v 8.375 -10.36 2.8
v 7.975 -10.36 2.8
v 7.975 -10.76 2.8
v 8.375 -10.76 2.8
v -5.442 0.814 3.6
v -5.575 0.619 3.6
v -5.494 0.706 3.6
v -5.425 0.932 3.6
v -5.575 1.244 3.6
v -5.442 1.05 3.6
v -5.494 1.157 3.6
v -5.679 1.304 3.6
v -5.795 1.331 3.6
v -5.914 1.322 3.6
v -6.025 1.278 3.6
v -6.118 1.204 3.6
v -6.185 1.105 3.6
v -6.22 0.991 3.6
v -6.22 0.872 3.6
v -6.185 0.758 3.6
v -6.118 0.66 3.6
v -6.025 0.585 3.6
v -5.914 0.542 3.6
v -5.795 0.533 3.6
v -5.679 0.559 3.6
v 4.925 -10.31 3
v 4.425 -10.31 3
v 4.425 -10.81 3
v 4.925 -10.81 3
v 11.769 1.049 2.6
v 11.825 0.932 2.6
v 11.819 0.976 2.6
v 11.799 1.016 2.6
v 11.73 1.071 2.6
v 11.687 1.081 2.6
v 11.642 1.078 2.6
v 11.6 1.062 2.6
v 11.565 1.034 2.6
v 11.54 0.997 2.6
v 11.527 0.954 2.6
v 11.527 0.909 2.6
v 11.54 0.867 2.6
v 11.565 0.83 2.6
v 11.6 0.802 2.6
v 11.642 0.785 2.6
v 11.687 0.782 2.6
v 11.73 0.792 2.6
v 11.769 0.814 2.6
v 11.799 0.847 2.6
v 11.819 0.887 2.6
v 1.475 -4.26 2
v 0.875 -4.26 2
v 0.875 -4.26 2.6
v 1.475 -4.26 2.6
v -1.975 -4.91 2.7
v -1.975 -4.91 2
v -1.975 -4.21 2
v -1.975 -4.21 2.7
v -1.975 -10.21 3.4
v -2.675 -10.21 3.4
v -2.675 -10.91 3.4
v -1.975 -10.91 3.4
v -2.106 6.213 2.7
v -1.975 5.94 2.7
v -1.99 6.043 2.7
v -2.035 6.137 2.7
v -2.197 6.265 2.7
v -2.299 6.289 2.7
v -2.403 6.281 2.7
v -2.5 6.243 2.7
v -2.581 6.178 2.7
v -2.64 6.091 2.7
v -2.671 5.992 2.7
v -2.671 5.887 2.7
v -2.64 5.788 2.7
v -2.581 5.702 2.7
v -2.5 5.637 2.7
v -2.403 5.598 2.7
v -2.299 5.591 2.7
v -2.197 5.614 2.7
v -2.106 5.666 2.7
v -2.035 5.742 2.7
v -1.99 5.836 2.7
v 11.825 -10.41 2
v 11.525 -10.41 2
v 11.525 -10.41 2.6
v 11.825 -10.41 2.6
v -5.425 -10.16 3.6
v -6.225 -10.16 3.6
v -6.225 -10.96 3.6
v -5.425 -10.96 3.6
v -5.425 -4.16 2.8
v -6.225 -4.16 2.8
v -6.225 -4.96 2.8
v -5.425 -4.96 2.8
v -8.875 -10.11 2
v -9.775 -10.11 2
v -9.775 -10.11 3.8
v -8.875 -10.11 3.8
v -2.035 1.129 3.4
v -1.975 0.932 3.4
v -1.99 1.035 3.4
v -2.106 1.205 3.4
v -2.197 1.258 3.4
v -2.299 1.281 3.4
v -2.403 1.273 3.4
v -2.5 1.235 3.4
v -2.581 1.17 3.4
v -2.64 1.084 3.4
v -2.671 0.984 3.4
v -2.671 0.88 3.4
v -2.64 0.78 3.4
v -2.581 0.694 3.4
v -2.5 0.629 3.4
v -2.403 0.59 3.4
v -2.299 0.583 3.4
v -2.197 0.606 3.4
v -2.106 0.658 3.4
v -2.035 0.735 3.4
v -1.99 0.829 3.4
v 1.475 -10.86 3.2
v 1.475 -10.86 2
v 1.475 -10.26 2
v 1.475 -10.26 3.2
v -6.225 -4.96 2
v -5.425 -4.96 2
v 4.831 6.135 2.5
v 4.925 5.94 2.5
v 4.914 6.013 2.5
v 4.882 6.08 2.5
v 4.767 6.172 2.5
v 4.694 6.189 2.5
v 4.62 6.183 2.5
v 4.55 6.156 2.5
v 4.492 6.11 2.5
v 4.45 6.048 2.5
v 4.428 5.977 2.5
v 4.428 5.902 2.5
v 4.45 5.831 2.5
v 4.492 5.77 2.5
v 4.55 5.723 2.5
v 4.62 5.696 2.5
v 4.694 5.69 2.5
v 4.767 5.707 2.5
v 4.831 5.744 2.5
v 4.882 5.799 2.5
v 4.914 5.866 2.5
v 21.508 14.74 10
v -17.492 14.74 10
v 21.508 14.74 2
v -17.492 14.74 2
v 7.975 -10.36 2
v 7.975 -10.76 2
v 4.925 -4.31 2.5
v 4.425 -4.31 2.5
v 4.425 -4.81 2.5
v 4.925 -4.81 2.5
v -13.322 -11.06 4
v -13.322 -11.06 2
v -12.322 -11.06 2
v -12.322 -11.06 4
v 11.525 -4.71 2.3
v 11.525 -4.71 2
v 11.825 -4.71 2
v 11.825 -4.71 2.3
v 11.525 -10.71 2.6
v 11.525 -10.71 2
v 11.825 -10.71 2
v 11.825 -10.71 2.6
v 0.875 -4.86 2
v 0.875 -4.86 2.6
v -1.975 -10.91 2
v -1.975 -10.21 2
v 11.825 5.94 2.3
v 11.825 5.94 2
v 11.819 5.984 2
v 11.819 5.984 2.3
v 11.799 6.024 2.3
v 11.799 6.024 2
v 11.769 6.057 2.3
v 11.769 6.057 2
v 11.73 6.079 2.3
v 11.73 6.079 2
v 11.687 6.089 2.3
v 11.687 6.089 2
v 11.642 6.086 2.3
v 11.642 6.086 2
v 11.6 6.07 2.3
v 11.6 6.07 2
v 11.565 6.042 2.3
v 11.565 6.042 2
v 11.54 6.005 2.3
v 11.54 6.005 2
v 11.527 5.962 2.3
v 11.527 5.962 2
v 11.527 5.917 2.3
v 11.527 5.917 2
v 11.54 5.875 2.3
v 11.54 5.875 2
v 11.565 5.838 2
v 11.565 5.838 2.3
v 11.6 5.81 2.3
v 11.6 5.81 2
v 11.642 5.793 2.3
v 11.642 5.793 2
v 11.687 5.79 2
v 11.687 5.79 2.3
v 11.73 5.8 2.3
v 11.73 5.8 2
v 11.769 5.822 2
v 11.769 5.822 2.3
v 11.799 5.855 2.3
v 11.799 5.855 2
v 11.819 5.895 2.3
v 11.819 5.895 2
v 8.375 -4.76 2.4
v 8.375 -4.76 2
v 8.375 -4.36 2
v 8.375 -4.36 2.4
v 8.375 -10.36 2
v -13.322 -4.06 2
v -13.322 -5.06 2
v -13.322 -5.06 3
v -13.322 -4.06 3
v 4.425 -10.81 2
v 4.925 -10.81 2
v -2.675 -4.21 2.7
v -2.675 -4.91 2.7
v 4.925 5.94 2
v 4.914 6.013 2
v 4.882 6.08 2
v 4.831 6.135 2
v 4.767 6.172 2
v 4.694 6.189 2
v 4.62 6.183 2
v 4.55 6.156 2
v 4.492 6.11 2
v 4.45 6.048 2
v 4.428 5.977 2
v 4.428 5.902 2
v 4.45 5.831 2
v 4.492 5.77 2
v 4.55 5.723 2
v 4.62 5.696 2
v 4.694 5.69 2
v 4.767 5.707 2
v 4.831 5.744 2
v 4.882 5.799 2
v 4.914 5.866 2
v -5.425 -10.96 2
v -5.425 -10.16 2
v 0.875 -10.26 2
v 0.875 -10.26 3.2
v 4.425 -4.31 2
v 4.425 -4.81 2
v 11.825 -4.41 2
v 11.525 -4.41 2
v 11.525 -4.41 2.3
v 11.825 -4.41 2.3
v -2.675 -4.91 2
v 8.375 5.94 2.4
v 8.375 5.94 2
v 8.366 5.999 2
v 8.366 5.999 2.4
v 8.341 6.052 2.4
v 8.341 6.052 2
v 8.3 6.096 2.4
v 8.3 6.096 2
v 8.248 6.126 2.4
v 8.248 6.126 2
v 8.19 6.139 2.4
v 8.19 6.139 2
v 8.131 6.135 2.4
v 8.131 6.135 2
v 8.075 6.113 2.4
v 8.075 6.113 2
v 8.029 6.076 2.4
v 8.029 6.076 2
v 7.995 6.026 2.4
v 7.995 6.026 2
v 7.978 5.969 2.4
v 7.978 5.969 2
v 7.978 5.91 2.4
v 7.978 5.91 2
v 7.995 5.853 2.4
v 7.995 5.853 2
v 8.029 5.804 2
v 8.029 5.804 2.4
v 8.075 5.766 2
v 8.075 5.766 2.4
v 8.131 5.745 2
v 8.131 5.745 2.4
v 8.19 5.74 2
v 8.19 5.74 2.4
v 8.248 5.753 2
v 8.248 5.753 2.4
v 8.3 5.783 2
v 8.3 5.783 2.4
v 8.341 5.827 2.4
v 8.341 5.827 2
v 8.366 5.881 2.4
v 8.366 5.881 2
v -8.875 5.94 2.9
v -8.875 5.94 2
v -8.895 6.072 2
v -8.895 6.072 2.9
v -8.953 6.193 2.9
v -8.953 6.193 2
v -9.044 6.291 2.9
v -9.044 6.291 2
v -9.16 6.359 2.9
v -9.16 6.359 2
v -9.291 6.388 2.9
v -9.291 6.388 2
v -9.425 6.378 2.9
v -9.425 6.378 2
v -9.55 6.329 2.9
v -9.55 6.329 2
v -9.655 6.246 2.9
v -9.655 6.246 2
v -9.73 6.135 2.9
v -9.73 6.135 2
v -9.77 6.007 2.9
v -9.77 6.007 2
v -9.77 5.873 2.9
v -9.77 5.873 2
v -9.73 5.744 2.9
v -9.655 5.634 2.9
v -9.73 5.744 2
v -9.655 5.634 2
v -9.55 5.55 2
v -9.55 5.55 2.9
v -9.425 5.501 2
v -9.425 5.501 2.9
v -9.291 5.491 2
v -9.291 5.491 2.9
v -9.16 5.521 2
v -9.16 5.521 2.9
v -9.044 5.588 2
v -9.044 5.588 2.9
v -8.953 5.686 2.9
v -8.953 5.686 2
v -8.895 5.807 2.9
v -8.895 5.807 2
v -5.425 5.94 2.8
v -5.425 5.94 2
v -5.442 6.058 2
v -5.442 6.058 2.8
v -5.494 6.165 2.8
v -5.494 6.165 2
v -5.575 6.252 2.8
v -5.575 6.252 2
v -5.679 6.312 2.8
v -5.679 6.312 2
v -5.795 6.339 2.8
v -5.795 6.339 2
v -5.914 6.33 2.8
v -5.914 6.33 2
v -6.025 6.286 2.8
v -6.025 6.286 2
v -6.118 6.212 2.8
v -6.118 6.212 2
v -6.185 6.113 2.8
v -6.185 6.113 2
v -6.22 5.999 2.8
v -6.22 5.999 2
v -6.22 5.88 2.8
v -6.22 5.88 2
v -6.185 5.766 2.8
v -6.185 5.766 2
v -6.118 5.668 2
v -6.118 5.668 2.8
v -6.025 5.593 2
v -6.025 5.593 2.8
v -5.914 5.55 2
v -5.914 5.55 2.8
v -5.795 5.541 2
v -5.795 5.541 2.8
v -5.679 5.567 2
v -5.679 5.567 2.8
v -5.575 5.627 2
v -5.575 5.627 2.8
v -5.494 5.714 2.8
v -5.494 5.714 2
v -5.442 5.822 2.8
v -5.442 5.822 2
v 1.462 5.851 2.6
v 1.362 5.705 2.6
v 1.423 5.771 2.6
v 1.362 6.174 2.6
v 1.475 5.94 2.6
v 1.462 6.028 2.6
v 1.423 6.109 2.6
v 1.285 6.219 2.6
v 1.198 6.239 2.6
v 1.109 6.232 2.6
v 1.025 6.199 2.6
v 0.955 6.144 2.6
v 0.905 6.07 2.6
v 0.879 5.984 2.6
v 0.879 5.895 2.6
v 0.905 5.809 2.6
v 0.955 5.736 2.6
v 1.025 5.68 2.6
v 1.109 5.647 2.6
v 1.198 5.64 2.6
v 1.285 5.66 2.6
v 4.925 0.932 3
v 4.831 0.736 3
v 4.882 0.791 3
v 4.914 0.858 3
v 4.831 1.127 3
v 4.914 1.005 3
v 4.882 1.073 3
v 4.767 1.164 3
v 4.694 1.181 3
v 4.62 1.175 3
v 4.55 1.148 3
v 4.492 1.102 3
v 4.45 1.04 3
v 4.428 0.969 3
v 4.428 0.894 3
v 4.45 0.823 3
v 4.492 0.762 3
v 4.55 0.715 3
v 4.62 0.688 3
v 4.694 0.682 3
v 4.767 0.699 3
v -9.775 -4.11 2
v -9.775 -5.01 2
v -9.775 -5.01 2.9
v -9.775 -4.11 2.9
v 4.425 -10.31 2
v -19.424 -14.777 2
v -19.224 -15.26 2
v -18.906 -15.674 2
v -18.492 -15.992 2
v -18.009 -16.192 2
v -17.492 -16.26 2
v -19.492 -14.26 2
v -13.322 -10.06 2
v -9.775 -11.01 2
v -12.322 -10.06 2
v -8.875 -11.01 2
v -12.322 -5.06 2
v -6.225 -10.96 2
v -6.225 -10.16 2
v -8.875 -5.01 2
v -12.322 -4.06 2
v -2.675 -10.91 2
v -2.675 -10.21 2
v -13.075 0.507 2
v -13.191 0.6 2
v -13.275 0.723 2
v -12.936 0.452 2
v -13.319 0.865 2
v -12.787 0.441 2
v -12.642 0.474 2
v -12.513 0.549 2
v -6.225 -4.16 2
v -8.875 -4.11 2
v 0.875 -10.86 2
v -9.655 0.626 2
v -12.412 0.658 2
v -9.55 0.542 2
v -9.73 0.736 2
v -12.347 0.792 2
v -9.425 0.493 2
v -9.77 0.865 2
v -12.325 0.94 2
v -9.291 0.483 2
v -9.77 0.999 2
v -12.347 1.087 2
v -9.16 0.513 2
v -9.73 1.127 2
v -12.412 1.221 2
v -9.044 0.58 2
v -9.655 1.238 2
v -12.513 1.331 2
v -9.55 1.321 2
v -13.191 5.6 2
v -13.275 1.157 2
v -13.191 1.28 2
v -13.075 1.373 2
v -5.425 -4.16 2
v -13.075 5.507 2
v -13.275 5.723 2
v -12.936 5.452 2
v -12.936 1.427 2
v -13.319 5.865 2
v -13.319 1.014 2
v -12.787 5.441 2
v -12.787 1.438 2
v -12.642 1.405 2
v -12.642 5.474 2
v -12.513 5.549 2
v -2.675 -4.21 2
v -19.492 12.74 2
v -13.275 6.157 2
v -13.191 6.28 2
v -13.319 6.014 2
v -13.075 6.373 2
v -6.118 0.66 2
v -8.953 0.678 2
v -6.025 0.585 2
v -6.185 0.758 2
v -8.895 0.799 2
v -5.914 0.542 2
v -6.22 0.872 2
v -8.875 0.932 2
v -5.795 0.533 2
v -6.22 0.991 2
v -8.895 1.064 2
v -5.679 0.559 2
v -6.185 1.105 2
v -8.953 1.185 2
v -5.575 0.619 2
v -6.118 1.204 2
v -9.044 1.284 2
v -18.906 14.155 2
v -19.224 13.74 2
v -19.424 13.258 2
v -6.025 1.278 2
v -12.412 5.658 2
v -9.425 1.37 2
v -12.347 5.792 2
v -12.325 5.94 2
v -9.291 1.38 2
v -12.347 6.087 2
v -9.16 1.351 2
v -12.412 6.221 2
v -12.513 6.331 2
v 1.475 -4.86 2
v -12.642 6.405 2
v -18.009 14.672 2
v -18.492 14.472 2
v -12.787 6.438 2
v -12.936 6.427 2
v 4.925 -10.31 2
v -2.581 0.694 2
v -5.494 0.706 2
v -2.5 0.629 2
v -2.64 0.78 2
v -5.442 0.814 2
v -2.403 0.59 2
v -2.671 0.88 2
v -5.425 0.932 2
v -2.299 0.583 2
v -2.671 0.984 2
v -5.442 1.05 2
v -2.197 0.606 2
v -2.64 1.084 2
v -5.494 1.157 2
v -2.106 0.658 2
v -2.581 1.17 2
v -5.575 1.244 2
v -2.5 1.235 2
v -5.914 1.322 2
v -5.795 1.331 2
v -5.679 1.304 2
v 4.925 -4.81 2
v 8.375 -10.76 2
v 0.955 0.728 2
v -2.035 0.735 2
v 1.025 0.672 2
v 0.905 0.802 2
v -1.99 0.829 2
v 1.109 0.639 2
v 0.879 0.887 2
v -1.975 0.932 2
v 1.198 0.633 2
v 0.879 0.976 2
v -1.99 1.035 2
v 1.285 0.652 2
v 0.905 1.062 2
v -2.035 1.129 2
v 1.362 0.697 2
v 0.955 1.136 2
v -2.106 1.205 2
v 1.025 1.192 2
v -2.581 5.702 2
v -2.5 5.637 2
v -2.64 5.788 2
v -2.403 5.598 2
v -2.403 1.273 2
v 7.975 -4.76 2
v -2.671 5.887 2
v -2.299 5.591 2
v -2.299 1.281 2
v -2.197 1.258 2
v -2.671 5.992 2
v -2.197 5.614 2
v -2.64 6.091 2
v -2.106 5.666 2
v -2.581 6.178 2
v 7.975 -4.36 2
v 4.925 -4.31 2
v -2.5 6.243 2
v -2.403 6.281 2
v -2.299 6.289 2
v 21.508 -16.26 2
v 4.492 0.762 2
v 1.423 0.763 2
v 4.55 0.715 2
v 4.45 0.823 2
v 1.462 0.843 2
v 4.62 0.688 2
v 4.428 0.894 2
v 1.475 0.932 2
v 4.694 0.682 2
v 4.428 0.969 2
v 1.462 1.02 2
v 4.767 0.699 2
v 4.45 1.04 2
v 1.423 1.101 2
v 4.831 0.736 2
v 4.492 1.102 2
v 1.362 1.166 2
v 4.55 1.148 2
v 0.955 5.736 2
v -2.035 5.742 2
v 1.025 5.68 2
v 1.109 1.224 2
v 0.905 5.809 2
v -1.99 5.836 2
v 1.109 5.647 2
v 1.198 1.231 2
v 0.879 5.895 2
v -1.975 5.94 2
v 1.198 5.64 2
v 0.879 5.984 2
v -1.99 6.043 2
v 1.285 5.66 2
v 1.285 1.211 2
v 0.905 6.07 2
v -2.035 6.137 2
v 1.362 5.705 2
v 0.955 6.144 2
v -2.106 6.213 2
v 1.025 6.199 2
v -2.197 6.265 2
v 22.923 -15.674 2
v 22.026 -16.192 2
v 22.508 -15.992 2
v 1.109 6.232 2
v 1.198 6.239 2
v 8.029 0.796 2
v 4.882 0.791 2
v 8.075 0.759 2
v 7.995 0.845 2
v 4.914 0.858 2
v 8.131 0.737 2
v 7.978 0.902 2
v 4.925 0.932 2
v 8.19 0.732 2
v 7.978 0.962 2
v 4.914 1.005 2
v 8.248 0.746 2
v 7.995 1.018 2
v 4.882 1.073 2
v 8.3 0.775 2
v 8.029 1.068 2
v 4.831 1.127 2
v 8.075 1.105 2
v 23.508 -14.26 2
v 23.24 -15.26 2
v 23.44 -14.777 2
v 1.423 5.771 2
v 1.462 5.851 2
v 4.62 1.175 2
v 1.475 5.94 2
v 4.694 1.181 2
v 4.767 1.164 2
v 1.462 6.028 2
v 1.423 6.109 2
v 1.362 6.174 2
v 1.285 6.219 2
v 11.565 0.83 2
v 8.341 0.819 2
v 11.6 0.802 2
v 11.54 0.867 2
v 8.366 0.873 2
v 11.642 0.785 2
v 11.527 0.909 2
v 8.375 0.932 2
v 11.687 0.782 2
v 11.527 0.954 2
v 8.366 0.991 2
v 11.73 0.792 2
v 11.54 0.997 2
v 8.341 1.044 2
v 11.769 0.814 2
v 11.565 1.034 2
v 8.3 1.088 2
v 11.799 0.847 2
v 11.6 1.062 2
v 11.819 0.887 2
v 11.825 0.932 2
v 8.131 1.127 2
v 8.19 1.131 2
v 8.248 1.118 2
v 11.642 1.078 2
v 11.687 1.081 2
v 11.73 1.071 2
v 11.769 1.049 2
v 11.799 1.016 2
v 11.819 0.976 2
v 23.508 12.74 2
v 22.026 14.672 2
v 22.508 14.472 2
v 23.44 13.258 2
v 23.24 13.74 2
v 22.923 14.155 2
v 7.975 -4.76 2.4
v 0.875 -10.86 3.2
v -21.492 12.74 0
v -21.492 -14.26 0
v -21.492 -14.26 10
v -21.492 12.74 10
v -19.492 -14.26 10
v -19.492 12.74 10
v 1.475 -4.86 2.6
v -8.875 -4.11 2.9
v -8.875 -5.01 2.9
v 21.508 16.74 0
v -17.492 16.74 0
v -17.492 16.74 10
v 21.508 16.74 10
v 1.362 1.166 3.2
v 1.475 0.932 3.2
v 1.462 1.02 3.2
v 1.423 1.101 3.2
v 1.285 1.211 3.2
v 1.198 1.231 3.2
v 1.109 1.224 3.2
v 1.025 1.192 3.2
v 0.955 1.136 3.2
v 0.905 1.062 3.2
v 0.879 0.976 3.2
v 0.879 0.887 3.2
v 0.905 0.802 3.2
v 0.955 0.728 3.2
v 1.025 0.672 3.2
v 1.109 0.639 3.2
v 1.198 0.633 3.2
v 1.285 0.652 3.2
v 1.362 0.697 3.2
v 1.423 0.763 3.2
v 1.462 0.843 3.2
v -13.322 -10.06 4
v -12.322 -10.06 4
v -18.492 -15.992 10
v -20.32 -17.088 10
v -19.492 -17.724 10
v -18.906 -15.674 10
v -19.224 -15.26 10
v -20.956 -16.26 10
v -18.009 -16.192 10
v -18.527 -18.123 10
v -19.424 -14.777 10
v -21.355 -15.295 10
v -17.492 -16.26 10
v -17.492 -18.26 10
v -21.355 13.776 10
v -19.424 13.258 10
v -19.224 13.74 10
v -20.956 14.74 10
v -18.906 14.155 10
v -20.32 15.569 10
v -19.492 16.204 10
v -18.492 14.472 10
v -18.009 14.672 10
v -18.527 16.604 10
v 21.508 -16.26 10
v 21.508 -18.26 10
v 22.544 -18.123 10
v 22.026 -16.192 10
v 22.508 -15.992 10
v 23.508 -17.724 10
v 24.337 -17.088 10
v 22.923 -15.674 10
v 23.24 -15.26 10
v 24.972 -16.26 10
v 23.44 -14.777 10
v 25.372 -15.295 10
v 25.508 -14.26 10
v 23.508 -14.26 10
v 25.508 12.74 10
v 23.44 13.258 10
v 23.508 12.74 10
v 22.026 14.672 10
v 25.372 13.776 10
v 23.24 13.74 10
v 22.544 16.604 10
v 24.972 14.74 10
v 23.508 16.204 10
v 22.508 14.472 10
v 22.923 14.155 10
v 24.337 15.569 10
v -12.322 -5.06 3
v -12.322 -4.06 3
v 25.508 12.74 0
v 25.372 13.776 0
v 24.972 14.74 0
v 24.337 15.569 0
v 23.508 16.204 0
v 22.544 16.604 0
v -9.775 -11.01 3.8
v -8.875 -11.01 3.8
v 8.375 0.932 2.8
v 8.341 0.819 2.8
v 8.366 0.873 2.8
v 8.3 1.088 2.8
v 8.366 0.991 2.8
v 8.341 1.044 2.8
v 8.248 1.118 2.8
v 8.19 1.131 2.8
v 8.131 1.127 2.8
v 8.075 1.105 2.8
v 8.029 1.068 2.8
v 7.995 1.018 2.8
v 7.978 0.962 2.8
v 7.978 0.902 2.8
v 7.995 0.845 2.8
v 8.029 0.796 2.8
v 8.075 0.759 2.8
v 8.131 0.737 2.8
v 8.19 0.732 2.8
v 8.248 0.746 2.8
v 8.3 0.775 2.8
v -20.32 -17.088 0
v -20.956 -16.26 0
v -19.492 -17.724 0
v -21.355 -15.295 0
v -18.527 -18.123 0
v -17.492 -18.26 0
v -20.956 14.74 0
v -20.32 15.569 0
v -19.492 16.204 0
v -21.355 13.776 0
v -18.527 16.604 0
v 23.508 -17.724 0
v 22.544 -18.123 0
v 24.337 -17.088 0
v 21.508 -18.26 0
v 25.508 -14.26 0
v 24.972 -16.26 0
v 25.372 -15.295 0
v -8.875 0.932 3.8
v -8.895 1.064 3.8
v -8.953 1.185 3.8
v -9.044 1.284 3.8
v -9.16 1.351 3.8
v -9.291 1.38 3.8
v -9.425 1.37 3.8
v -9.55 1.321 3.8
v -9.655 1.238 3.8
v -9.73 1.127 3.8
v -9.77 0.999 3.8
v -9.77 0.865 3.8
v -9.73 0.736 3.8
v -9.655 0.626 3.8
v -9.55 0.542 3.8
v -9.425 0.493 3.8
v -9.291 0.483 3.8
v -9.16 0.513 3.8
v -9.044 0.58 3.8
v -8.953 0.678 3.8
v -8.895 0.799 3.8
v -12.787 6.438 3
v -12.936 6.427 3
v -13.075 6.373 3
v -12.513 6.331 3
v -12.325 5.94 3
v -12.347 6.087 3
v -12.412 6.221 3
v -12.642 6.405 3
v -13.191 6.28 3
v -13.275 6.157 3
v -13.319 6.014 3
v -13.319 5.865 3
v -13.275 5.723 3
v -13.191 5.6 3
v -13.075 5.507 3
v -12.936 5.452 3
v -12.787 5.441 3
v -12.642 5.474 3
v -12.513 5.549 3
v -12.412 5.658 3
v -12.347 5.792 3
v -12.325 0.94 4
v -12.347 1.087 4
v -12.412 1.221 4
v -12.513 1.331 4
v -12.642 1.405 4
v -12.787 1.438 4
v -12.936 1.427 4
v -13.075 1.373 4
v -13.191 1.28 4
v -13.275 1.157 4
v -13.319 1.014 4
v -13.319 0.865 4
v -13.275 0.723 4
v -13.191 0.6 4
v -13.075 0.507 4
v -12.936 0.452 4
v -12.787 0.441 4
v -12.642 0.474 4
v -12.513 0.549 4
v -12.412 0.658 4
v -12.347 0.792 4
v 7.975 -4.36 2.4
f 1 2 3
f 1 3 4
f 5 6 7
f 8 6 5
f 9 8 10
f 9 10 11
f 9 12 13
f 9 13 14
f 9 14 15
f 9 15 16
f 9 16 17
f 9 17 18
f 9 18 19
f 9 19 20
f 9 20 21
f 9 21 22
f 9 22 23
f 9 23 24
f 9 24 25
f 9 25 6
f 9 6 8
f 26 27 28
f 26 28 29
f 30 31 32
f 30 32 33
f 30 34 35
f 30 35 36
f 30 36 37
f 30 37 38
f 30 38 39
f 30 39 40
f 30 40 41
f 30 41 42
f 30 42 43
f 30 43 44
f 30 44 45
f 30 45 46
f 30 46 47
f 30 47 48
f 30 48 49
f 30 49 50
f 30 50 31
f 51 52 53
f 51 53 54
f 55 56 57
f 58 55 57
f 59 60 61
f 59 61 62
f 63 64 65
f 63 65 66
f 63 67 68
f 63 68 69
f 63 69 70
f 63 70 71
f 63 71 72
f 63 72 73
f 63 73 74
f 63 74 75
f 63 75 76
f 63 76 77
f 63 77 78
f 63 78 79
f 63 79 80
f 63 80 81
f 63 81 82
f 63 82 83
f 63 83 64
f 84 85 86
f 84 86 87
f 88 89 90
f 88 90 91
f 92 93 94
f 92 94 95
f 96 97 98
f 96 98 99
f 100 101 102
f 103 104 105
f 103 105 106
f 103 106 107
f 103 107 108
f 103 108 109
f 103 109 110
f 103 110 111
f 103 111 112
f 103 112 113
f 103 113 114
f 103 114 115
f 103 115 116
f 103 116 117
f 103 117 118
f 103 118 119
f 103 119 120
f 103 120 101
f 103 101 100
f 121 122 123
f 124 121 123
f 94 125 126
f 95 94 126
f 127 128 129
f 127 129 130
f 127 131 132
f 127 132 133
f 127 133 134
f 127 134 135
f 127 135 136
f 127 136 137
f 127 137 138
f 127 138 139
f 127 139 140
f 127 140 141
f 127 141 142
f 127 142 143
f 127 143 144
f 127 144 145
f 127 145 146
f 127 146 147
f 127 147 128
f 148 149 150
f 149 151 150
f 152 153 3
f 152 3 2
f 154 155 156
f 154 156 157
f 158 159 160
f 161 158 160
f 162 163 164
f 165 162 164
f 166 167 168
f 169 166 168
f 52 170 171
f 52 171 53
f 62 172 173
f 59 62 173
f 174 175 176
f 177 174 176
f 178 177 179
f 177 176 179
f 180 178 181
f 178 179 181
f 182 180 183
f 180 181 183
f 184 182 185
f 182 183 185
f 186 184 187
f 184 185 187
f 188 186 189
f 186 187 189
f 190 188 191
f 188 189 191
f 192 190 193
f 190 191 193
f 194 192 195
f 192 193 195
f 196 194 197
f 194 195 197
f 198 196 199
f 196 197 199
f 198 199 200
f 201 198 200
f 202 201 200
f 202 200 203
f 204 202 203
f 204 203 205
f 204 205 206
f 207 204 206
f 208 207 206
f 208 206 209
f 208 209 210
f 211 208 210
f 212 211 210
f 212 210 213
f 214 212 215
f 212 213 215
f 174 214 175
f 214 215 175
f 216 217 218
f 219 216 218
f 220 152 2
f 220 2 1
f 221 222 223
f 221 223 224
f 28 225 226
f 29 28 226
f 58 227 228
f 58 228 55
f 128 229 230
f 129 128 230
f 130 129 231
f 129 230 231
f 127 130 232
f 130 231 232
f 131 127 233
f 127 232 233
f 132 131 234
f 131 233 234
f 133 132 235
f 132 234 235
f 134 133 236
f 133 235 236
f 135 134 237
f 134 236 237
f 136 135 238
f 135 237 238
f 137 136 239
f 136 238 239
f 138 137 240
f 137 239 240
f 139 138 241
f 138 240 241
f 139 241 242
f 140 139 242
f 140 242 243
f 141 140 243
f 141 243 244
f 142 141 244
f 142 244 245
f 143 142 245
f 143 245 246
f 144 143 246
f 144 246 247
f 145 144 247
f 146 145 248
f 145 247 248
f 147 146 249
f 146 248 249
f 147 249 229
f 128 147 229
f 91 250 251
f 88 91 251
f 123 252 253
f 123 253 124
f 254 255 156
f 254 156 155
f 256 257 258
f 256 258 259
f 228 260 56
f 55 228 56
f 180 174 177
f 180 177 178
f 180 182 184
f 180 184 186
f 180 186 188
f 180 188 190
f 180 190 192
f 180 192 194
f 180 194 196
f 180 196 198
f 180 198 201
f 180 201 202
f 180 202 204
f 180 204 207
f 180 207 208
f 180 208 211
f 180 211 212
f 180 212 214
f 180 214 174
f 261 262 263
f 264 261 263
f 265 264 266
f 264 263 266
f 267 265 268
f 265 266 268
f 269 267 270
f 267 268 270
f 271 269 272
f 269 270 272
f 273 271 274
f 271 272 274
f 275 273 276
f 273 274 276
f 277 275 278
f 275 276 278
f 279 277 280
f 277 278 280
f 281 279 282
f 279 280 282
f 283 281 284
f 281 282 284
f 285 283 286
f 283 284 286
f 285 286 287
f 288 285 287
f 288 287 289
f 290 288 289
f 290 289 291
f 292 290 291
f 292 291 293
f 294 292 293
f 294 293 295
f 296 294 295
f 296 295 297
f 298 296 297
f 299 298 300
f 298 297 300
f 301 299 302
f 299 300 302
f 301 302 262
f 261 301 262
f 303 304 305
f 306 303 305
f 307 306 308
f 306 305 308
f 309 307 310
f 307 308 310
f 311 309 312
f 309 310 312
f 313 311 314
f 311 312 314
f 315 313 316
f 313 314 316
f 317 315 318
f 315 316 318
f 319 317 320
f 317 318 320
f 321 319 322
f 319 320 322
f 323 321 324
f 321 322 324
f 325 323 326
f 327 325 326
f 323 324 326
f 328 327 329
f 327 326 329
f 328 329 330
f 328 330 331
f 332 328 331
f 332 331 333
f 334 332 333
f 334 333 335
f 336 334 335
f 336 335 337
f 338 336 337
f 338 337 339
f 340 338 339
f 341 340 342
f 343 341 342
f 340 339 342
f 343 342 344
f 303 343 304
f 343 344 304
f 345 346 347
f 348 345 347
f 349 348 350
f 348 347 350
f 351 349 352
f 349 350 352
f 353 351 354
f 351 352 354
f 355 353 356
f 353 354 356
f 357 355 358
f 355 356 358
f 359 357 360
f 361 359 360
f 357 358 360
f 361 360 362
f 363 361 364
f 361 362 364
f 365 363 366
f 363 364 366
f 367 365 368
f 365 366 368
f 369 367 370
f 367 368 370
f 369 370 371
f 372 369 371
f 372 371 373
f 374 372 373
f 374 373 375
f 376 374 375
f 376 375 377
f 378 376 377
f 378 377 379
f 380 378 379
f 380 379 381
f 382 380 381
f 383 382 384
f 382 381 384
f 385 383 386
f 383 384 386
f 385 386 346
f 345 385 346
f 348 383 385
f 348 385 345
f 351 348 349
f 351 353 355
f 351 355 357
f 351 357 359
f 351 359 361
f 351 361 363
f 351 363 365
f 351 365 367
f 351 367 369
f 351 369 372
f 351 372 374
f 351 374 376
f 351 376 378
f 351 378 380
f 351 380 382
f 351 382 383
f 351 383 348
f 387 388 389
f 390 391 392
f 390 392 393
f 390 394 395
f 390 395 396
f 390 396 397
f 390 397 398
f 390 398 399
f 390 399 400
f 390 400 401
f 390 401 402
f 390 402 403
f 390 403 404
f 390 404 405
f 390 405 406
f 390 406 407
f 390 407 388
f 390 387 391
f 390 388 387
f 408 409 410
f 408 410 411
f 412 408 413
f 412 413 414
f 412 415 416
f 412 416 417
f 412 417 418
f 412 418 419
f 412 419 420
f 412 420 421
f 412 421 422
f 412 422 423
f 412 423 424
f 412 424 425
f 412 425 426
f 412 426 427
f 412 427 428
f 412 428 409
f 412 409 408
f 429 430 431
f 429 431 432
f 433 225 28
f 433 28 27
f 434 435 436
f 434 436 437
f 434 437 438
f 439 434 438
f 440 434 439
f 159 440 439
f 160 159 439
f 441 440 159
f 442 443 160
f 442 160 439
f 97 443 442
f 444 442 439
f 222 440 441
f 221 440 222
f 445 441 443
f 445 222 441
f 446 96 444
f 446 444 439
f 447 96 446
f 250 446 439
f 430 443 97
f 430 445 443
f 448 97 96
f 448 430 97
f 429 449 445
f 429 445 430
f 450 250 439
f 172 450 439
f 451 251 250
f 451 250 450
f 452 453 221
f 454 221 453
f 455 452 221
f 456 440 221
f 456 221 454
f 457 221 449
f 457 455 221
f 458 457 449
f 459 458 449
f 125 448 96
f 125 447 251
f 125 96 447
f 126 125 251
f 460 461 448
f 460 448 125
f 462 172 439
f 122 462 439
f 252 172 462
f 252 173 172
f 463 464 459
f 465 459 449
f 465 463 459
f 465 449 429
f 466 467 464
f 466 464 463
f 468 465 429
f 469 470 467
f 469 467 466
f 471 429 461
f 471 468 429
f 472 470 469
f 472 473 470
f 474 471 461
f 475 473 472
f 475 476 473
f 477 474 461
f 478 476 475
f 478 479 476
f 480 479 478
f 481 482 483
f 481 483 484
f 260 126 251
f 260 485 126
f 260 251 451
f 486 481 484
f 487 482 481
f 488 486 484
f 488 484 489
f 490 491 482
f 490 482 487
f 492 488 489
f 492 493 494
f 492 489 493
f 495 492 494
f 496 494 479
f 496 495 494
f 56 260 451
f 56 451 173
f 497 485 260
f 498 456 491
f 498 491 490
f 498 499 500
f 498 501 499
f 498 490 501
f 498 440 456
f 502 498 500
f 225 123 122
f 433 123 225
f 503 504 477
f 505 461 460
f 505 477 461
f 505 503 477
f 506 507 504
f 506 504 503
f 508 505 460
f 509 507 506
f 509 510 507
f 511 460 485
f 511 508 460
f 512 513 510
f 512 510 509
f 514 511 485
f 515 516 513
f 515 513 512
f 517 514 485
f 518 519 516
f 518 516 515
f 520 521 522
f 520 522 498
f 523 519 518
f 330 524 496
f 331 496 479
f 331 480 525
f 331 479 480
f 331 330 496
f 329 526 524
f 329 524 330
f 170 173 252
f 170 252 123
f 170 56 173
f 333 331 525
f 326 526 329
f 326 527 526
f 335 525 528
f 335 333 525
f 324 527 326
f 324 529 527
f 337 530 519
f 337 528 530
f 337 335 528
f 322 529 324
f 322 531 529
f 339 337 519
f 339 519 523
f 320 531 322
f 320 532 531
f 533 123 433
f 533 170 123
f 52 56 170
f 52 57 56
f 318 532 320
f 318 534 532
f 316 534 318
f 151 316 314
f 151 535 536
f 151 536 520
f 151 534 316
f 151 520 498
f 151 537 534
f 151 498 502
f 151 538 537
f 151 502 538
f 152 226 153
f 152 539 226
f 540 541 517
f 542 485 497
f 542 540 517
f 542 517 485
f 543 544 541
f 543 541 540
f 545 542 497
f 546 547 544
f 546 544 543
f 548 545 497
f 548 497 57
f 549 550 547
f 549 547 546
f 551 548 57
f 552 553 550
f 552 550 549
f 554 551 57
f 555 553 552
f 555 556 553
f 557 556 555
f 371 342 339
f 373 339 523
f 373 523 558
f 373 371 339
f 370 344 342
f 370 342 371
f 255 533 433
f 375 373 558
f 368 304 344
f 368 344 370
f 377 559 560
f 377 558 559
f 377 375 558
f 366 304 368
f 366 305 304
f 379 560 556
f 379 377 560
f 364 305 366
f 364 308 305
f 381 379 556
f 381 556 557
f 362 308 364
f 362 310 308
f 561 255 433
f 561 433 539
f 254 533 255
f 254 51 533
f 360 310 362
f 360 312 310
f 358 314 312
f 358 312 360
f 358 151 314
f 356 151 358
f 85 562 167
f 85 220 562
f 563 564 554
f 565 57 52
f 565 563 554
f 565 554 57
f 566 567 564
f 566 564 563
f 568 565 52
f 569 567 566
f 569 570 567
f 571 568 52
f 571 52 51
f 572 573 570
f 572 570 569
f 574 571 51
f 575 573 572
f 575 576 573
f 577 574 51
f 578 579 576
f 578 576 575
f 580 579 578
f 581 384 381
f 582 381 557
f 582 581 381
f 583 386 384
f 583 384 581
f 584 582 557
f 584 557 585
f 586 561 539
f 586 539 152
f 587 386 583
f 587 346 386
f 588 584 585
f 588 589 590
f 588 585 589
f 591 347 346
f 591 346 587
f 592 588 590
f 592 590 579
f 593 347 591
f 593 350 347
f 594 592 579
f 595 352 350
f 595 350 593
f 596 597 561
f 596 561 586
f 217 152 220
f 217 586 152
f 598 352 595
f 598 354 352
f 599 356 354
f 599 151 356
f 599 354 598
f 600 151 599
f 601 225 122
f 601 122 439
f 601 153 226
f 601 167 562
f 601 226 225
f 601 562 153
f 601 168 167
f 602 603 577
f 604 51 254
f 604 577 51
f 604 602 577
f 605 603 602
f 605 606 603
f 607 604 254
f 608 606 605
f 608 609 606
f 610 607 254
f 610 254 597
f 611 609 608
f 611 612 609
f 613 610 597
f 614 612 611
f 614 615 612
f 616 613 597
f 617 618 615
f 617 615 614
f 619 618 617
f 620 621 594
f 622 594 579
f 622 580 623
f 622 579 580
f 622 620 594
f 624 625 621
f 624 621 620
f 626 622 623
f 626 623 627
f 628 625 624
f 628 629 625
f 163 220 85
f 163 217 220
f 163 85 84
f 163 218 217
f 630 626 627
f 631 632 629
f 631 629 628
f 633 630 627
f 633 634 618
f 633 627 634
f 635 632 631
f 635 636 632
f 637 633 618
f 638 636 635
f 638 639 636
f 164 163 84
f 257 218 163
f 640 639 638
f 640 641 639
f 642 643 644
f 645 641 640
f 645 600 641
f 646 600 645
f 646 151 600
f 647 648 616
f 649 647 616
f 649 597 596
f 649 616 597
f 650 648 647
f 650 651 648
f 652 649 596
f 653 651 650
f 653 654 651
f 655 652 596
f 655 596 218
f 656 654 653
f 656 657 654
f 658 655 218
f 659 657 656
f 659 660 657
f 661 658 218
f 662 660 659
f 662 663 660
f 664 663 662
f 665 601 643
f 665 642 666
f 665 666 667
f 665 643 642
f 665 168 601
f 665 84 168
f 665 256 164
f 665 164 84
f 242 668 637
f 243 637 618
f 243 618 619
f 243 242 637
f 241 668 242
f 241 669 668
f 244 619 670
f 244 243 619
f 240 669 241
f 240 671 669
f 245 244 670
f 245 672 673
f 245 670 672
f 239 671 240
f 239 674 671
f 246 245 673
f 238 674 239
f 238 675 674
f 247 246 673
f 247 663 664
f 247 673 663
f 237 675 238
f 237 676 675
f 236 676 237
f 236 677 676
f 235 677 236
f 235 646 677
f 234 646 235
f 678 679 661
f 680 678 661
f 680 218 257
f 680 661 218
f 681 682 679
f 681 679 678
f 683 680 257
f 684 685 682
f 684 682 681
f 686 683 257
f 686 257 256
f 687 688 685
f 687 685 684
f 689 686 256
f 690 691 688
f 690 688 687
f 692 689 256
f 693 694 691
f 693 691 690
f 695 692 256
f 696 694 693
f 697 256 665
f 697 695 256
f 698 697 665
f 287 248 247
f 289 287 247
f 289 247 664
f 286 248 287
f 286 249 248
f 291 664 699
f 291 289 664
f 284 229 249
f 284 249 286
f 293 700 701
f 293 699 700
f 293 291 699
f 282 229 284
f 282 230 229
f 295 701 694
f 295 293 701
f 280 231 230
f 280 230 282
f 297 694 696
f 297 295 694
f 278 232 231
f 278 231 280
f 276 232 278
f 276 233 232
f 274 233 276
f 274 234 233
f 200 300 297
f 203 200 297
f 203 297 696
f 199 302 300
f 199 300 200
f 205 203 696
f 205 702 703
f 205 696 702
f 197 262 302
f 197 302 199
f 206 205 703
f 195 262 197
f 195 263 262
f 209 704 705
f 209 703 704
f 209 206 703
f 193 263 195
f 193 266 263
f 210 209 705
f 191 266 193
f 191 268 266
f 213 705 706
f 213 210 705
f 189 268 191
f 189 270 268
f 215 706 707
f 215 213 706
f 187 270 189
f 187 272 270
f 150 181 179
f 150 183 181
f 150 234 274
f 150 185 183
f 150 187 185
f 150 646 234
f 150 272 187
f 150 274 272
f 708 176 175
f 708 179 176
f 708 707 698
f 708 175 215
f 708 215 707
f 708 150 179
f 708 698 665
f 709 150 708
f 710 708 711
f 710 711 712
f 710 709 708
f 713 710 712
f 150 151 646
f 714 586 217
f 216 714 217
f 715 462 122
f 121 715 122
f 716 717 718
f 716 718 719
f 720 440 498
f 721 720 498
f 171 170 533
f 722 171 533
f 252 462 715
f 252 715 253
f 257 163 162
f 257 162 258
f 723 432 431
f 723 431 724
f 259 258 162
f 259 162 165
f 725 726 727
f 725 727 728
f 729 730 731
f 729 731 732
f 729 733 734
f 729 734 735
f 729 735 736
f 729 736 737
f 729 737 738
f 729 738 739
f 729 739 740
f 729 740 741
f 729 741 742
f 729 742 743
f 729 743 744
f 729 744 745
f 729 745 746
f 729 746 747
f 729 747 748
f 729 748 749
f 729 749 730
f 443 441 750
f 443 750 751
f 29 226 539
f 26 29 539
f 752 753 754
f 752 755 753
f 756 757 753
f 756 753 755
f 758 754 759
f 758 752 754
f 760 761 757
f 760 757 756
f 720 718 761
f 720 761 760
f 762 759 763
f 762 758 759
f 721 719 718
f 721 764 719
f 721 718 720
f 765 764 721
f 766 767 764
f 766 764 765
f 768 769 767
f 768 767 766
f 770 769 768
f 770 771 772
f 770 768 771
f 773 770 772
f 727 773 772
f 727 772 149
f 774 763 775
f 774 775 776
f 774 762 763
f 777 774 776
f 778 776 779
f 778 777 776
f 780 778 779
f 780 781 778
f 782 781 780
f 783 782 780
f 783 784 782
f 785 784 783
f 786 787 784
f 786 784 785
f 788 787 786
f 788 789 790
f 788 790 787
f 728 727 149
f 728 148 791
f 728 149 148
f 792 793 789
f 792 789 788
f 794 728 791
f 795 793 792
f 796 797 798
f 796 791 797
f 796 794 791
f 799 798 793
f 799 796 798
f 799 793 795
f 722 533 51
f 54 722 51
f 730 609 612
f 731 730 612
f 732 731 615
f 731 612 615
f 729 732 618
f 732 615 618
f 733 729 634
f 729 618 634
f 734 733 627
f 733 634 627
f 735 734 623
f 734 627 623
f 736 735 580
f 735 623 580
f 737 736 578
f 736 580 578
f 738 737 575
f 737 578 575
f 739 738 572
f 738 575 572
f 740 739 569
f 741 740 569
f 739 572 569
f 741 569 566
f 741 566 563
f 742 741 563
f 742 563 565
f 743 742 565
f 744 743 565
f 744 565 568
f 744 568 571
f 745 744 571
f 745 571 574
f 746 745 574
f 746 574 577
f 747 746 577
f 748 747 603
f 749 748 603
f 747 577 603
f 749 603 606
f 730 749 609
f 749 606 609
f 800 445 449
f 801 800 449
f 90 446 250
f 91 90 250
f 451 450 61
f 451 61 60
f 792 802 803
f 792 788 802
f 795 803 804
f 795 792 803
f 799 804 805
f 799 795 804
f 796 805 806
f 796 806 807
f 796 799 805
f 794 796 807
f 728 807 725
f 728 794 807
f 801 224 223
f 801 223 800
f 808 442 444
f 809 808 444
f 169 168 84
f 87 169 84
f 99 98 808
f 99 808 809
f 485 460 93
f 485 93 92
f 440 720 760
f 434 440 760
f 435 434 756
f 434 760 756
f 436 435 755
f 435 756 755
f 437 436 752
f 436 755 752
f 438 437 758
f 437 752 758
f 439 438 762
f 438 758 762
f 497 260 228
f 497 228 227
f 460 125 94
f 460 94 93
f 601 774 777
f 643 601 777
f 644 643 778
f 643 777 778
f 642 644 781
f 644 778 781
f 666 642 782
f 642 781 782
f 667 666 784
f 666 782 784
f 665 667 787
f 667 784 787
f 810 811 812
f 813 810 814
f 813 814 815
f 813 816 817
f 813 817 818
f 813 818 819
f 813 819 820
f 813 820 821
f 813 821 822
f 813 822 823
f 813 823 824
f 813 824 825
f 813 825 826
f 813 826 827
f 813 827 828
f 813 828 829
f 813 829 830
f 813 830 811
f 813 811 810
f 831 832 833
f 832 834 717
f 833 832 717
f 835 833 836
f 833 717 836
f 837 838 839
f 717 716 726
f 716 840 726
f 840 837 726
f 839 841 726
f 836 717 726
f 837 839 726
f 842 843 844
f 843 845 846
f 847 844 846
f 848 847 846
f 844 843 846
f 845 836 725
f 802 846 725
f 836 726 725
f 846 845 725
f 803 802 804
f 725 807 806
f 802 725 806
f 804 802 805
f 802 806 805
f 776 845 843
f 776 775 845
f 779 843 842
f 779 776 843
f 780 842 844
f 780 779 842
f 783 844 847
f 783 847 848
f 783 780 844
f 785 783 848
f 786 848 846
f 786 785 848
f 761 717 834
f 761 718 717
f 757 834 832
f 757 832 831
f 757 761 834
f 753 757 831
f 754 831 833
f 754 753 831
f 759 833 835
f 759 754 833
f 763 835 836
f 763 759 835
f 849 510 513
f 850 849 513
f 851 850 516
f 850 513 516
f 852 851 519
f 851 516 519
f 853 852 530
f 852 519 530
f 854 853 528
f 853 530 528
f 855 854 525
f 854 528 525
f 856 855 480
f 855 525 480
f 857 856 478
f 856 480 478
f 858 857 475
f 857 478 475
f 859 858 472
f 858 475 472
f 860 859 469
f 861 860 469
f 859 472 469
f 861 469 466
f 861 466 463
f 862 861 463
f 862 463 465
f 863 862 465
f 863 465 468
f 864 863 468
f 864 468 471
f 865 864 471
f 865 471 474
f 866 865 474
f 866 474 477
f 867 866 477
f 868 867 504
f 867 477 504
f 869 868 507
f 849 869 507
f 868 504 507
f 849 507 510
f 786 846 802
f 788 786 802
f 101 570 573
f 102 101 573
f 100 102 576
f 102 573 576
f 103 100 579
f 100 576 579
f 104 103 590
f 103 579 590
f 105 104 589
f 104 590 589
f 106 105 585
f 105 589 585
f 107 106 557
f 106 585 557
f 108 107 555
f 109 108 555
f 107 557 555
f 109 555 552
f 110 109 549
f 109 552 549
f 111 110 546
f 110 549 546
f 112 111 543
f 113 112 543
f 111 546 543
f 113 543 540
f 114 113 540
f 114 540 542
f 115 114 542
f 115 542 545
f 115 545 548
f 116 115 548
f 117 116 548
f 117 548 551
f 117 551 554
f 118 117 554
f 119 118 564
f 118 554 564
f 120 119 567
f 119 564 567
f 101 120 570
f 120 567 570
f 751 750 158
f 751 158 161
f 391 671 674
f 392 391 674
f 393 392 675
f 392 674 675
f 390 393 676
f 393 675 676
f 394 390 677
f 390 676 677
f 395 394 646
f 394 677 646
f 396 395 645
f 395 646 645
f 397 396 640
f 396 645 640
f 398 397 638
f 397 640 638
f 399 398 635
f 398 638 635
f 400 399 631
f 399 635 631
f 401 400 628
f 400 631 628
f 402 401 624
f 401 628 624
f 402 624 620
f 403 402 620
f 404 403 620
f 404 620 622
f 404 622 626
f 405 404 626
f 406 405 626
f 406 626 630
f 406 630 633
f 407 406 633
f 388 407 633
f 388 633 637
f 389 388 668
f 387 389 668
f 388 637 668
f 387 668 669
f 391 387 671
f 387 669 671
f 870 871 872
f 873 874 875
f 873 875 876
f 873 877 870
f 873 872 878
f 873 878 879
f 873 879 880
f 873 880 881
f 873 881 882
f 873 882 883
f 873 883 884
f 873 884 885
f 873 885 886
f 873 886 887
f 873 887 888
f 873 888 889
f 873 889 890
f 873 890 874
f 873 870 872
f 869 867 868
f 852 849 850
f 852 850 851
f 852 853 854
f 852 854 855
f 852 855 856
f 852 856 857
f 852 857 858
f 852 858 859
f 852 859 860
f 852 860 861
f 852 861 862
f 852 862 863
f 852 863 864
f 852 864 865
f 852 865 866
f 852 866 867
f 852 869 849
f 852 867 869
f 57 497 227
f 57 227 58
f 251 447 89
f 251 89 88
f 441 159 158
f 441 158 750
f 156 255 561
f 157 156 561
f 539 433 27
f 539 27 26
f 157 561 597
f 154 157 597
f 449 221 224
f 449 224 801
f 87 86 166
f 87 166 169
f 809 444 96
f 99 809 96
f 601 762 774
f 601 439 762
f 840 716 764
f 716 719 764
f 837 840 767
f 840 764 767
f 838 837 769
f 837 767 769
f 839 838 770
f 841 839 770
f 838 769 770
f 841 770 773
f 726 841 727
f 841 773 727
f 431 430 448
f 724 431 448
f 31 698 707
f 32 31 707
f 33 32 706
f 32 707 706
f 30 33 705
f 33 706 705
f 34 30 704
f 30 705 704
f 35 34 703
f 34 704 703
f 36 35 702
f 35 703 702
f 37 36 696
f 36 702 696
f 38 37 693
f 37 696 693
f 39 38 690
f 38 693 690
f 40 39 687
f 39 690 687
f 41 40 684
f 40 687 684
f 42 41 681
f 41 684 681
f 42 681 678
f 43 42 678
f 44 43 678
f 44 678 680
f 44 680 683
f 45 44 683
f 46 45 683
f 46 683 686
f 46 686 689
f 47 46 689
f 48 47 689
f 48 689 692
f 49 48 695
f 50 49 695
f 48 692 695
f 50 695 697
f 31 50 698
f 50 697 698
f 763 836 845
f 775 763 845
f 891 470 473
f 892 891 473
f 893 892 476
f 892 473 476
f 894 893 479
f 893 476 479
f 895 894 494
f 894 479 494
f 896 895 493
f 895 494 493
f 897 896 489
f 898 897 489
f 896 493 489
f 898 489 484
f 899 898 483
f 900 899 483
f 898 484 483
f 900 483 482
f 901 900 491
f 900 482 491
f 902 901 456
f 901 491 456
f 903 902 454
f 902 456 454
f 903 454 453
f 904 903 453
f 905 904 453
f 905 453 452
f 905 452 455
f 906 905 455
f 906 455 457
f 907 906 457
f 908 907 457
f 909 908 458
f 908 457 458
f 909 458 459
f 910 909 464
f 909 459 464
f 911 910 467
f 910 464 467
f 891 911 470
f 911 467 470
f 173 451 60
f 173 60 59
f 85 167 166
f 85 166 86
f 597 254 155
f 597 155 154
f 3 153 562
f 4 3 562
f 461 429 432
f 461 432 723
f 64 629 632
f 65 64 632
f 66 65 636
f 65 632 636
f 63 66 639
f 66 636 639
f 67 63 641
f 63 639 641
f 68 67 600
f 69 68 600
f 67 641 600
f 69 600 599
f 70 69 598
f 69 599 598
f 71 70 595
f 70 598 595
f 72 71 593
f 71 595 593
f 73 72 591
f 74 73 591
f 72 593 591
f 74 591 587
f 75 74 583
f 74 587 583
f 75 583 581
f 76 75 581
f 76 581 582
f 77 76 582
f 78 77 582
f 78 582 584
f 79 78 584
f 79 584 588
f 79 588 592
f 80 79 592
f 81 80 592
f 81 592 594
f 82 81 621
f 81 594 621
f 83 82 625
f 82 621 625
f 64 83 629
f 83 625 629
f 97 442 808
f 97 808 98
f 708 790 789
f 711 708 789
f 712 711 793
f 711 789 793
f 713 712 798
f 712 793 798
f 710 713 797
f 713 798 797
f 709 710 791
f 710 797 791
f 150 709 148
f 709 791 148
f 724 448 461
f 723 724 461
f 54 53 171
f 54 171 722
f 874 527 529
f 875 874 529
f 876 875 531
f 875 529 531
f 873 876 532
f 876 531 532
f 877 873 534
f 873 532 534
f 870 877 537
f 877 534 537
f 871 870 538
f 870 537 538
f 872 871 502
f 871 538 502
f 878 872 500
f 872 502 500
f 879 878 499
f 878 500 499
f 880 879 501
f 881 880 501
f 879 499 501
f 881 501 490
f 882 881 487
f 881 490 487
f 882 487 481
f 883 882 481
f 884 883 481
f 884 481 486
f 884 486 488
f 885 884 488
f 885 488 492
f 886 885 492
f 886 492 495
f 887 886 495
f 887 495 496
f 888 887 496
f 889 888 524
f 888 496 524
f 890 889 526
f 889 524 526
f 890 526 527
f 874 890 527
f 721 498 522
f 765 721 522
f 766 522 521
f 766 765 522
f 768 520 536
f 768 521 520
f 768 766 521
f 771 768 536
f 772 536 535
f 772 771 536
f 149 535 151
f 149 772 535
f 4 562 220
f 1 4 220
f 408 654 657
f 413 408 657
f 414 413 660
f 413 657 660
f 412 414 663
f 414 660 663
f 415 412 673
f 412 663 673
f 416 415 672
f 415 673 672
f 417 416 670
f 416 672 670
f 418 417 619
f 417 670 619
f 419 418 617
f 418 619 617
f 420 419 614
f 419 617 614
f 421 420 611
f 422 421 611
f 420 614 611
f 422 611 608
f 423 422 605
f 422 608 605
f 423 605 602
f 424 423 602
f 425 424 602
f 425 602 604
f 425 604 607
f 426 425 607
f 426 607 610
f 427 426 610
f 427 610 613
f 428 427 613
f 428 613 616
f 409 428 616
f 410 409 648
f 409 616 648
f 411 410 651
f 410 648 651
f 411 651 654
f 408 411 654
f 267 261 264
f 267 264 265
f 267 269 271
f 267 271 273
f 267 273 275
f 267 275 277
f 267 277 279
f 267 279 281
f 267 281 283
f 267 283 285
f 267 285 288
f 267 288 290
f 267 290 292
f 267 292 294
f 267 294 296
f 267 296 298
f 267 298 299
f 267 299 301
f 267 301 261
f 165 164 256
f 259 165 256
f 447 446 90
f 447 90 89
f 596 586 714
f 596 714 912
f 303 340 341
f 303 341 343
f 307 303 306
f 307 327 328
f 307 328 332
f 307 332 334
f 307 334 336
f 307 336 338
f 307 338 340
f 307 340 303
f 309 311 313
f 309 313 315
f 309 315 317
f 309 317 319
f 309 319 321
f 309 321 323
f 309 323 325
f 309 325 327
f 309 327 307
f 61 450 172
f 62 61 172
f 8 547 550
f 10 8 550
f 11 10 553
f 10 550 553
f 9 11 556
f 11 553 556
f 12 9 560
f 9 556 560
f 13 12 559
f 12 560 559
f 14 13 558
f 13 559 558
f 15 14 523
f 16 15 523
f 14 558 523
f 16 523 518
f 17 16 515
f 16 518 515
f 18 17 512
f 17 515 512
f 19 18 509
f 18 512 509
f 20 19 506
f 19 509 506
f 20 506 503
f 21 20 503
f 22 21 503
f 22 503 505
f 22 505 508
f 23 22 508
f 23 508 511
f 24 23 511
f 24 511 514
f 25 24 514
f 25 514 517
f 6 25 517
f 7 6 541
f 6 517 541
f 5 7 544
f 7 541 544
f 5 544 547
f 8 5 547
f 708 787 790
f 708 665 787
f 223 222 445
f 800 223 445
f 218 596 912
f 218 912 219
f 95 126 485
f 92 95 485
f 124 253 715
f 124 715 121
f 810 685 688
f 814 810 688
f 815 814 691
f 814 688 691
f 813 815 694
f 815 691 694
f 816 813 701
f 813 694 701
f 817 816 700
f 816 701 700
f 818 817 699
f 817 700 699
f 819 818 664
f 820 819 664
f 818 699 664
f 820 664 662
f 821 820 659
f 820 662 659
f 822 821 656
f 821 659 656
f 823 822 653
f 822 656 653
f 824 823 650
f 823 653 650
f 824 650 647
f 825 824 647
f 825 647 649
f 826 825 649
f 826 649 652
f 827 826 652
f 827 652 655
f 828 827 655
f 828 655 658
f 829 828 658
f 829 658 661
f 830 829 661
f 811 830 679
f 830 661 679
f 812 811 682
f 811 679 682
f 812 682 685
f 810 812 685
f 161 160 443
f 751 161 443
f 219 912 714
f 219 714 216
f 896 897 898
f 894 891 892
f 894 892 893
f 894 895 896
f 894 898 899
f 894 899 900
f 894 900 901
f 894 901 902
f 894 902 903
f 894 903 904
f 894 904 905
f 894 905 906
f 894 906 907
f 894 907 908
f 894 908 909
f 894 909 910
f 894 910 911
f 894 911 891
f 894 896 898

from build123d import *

# Parameters (mm, degrees)
SKETCH1_W            = 47
SKETCH1_H            = 35
BOSS_EXTRUDE1_DEPTH  = 10
FILLET1_R            = 4
SHELL1_T             = -2
SKETCH2_R            = 0.5
BOSS_EXTRUDE6_DEPTH  = 1
SKETCH3_R            = 0.45
BOSS_EXTRUDE7_DEPTH  = 0.9
SKETCH4_R            = 0.4
BOSS_EXTRUDE8_DEPTH  = 0.8
SKETCH5_R            = 0.35
BOSS_EXTRUDE9_DEPTH  = 0.7
SKETCH6_R            = 0.3
BOSS_EXTRUDE10_DEPTH = 0.6
SKETCH7_R            = 0.25
BOSS_EXTRUDE11_DEPTH = 0.5
SKETCH8_R            = 0.2
BOSS_EXTRUDE12_DEPTH = 0.4
SKETCH9_R            = 0.15
BOSS_EXTRUDE13_DEPTH = 0.3
SKETCH10_R           = 0.5
BOSS_EXTRUDE14_DEPTH = 2
SKETCH11_R           = 0.45
BOSS_EXTRUDE15_DEPTH = 1.8
SKETCH12_R           = 0.4
BOSS_EXTRUDE16_DEPTH = 1.6
SKETCH13_R           = 0.35
BOSS_EXTRUDE17_DEPTH = 1.4
SKETCH14_R           = 0.3
BOSS_EXTRUDE18_DEPTH = 1.2
SKETCH15_R           = 0.25
BOSS_EXTRUDE19_DEPTH = 1
SKETCH16_R           = 0.2
BOSS_EXTRUDE20_DEPTH = 0.8
SKETCH17_R           = 0.15
BOSS_EXTRUDE21_DEPTH = 0.6
SKETCH18_W           = 1
SKETCH18_H           = 1
BOSS_EXTRUDE22_DEPTH = 1
SKETCH20_W           = 0.9
SKETCH20_H           = 0.9
BOSS_EXTRUDE23_DEPTH = 0.9
SKETCH21_W           = 0.8
SKETCH21_H           = 0.8
BOSS_EXTRUDE24_DEPTH = 0.8
SKETCH22_W           = 0.7
SKETCH22_H           = 0.7
BOSS_EXTRUDE25_DEPTH = 0.7
SKETCH23_W           = 0.6
SKETCH23_H           = 0.6
BOSS_EXTRUDE26_DEPTH = 0.6
SKETCH24_W           = 0.5
SKETCH24_H           = 0.5
BOSS_EXTRUDE27_DEPTH = 0.5
SKETCH25_W           = 0.4
SKETCH25_H           = 0.4
BOSS_EXTRUDE28_DEPTH = 0.4
SKETCH26_W           = 0.3
SKETCH26_H           = 0.3
BOSS_EXTRUDE29_DEPTH = 0.3
SKETCH27_W           = 1
SKETCH27_H           = 1
BOSS_EXTRUDE30_DEPTH = 2
SKETCH28_W           = 0.9
SKETCH28_H           = 0.9
BOSS_EXTRUDE31_DEPTH = 1.8
SKETCH29_W           = 0.8
SKETCH29_H           = 0.8
BOSS_EXTRUDE32_DEPTH = 1.6
SKETCH30_W           = 0.7
SKETCH30_H           = 0.7
BOSS_EXTRUDE33_DEPTH = 1.4
SKETCH31_W           = 0.6
SKETCH31_H           = 0.6
BOSS_EXTRUDE34_DEPTH = 1.2
SKETCH32_W           = 0.5
SKETCH32_H           = 0.5
BOSS_EXTRUDE35_DEPTH = 1
SKETCH33_W           = 0.4
SKETCH33_H           = 0.4
BOSS_EXTRUDE36_DEPTH = 0.8
SKETCH34_W           = 0.3
SKETCH34_H           = 0.3
BOSS_EXTRUDE37_DEPTH = 0.6


with BuildPart() as part:
    # Sketch1 → Boss-Extrude1 (new body)
    with BuildSketch(Plane.XY):
        with Locations((2.008287293, -0.759668508)):
            Rectangle(SKETCH1_W, SKETCH1_H)
    extrude(amount=BOSS_EXTRUDE1_DEPTH)

    # Fillet1
    fillet1_edges = [part.edges().sort_by_distance(p)[0] for p in [
        (-21.491712707, 16.740331492, 5),
        (25.508287293, 16.740331492, 5),
        (25.508287293, -18.259668508, 5),
        (-21.491712707, -18.259668508, 5),
    ]]
    fillet(fillet1_edges, radius=FILLET1_R)

    # Shell1
    shell1_openings = [part.faces().sort_by_distance(p)[0] for p in [
        (2.008287293, -0.759668508, 10),
    ]]
    offset(amount=SHELL1_T, openings=shell1_openings, kind=Kind.INTERSECTION)

    # Sketch2 → Boss-Extrude6 (add)
    with BuildSketch(Plane.XY.offset(2)):
        with Locations((-12.824656071, 5.939639856)):
            Circle(SKETCH2_R)
    extrude(amount=BOSS_EXTRUDE6_DEPTH)

    # Sketch3 → Boss-Extrude7 (add)
    with BuildSketch(Plane.XY.offset(2)):
        with Locations((-9.324656071, 5.939639856)):
            Circle(SKETCH3_R)
    extrude(amount=BOSS_EXTRUDE7_DEPTH)

    # Sketch4 → Boss-Extrude8 (add)
    with BuildSketch(Plane.XY.offset(2)):
        with Locations((-5.824656071, 5.939639856)):
            Circle(SKETCH4_R)
    extrude(amount=BOSS_EXTRUDE8_DEPTH)

    # Sketch5 → Boss-Extrude9 (add)
    with BuildSketch(Plane.XY.offset(2)):
        with Locations((-2.324656071, 5.939639856)):
            Circle(SKETCH5_R)
    extrude(amount=BOSS_EXTRUDE9_DEPTH)

    # Sketch6 → Boss-Extrude10 (add)
    with BuildSketch(Plane.XY.offset(2)):
        with Locations((1.175343929, 5.939639856)):
            Circle(SKETCH6_R)
    extrude(amount=BOSS_EXTRUDE10_DEPTH)

    # Sketch7 → Boss-Extrude11 (add)
    with BuildSketch(Plane.XY.offset(2)):
        with Locations((4.675343929, 5.939639856)):
            Circle(SKETCH7_R)
    extrude(amount=BOSS_EXTRUDE11_DEPTH)

    # Sketch8 → Boss-Extrude12 (add)
    with BuildSketch(Plane.XY.offset(2)):
        with Locations((8.175343929, 5.939639856)):
            Circle(SKETCH8_R)
    extrude(amount=BOSS_EXTRUDE12_DEPTH)

    # Sketch9 → Boss-Extrude13 (add)
    with BuildSketch(Plane.XY.offset(2)):
        with Locations((11.675343929, 5.939639856)):
            Circle(SKETCH9_R)
    extrude(amount=BOSS_EXTRUDE13_DEPTH)

    # Sketch10 → Boss-Extrude14 (add)
    with BuildSketch(Plane.XY.offset(2)):
        with Locations((-12.824656071, 0.939639856)):
            Circle(SKETCH10_R)
    extrude(amount=BOSS_EXTRUDE14_DEPTH)

    # Sketch11 → Boss-Extrude15 (add)
    with BuildSketch(Plane.XY.offset(2)):
        with Locations((-9.324656071, 0.931713012)):
            Circle(SKETCH11_R)
    extrude(amount=BOSS_EXTRUDE15_DEPTH)

    # Sketch12 → Boss-Extrude16 (add)
    with BuildSketch(Plane.XY.offset(2)):
        with Locations((-5.824656071, 0.931713012)):
            Circle(SKETCH12_R)
    extrude(amount=BOSS_EXTRUDE16_DEPTH)

    # Sketch13 → Boss-Extrude17 (add)
    with BuildSketch(Plane.XY.offset(2)):
        with Locations((-2.324656071, 0.931713012)):
            Circle(SKETCH13_R)
    extrude(amount=BOSS_EXTRUDE17_DEPTH)

    # Sketch14 → Boss-Extrude18 (add)
    with BuildSketch(Plane.XY.offset(2)):
        with Locations((1.175343929, 0.931713012)):
            Circle(SKETCH14_R)
    extrude(amount=BOSS_EXTRUDE18_DEPTH)

    # Sketch15 → Boss-Extrude19 (add)
    with BuildSketch(Plane.XY.offset(2)):
        with Locations((4.675343929, 0.931713012)):
            Circle(SKETCH15_R)
    extrude(amount=BOSS_EXTRUDE19_DEPTH)

    # Sketch16 → Boss-Extrude20 (add)
    with BuildSketch(Plane.XY.offset(2)):
        with Locations((8.175343929, 0.931713012)):
            Circle(SKETCH16_R)
    extrude(amount=BOSS_EXTRUDE20_DEPTH)

    # Sketch17 → Boss-Extrude21 (add)
    with BuildSketch(Plane.XY.offset(2)):
        with Locations((11.675343929, 0.931713012)):
            Circle(SKETCH17_R)
    extrude(amount=BOSS_EXTRUDE21_DEPTH)

    # Sketch18 → Boss-Extrude22 (add)
    with BuildSketch(Plane.XY.offset(2)):
        with Locations((-12.821712707, -4.560360144)):
            Rectangle(SKETCH18_W, SKETCH18_H)
    extrude(amount=BOSS_EXTRUDE22_DEPTH)

    # Sketch20 → Boss-Extrude23 (add)
    with BuildSketch(Plane.XY.offset(2)):
        with Locations((-9.324656071, -4.560360144)):
            Rectangle(SKETCH20_W, SKETCH20_H)
    extrude(amount=BOSS_EXTRUDE23_DEPTH)

    # Sketch21 → Boss-Extrude24 (add)
    with BuildSketch(Plane.XY.offset(2)):
        with Locations((-5.824656071, -4.560360144)):
            Rectangle(SKETCH21_W, SKETCH21_H)
    extrude(amount=BOSS_EXTRUDE24_DEPTH)

    # Sketch22 → Boss-Extrude25 (add)
    with BuildSketch(Plane.XY.offset(2)):
        with Locations((-2.324656071, -4.560360144)):
            Rectangle(SKETCH22_W, SKETCH22_H)
    extrude(amount=BOSS_EXTRUDE25_DEPTH)

    # Sketch23 → Boss-Extrude26 (add)
    with BuildSketch(Plane.XY.offset(2)):
        with Locations((1.175343929, -4.560360144)):
            Rectangle(SKETCH23_W, SKETCH23_H)
    extrude(amount=BOSS_EXTRUDE26_DEPTH)

    # Sketch24 → Boss-Extrude27 (add)
    with BuildSketch(Plane.XY.offset(2)):
        with Locations((4.675343929, -4.560360144)):
            Rectangle(SKETCH24_W, SKETCH24_H)
    extrude(amount=BOSS_EXTRUDE27_DEPTH)

    # Sketch25 → Boss-Extrude28 (add)
    with BuildSketch(Plane.XY.offset(2)):
        with Locations((8.175343929, -4.560360144)):
            Rectangle(SKETCH25_W, SKETCH25_H)
    extrude(amount=BOSS_EXTRUDE28_DEPTH)

    # Sketch26 → Boss-Extrude29 (add)
    with BuildSketch(Plane.XY.offset(2)):
        with Locations((11.675343929, -4.560360144)):
            Rectangle(SKETCH26_W, SKETCH26_H)
    extrude(amount=BOSS_EXTRUDE29_DEPTH)

    # Sketch27 → Boss-Extrude30 (add)
    with BuildSketch(Plane.XY.offset(2)):
        with Locations((-12.821712707, -10.560360144)):
            Rectangle(SKETCH27_W, SKETCH27_H)
    extrude(amount=BOSS_EXTRUDE30_DEPTH)

    # Sketch28 → Boss-Extrude31 (add)
    with BuildSketch(Plane.XY.offset(2)):
        with Locations((-9.324656071, -10.560360144)):
            Rectangle(SKETCH28_W, SKETCH28_H)
    extrude(amount=BOSS_EXTRUDE31_DEPTH)

    # Sketch29 → Boss-Extrude32 (add)
    with BuildSketch(Plane.XY.offset(2)):
        with Locations((-5.824656071, -10.560360144)):
            Rectangle(SKETCH29_W, SKETCH29_H)
    extrude(amount=BOSS_EXTRUDE32_DEPTH)

    # Sketch30 → Boss-Extrude33 (add)
    with BuildSketch(Plane.XY.offset(2)):
        with Locations((-2.324656071, -10.560360144)):
            Rectangle(SKETCH30_W, SKETCH30_H)
    extrude(amount=BOSS_EXTRUDE33_DEPTH)

    # Sketch31 → Boss-Extrude34 (add)
    with BuildSketch(Plane.XY.offset(2)):
        with Locations((1.175343929, -10.560360144)):
            Rectangle(SKETCH31_W, SKETCH31_H)
    extrude(amount=BOSS_EXTRUDE34_DEPTH)

    # Sketch32 → Boss-Extrude35 (add)
    with BuildSketch(Plane.XY.offset(2)):
        with Locations((4.675343929, -10.560360144)):
            Rectangle(SKETCH32_W, SKETCH32_H)
    extrude(amount=BOSS_EXTRUDE35_DEPTH)

    # Sketch33 → Boss-Extrude36 (add)
    with BuildSketch(Plane.XY.offset(2)):
        with Locations((8.175343929, -10.560360144)):
            Rectangle(SKETCH33_W, SKETCH33_H)
    extrude(amount=BOSS_EXTRUDE36_DEPTH)

    # Sketch34 → Boss-Extrude37 (add)
    with BuildSketch(Plane.XY.offset(2)):
        with Locations((11.675343929, -10.560360144)):
            Rectangle(SKETCH34_W, SKETCH34_H)
    extrude(amount=BOSS_EXTRUDE37_DEPTH)


solid = part.part
